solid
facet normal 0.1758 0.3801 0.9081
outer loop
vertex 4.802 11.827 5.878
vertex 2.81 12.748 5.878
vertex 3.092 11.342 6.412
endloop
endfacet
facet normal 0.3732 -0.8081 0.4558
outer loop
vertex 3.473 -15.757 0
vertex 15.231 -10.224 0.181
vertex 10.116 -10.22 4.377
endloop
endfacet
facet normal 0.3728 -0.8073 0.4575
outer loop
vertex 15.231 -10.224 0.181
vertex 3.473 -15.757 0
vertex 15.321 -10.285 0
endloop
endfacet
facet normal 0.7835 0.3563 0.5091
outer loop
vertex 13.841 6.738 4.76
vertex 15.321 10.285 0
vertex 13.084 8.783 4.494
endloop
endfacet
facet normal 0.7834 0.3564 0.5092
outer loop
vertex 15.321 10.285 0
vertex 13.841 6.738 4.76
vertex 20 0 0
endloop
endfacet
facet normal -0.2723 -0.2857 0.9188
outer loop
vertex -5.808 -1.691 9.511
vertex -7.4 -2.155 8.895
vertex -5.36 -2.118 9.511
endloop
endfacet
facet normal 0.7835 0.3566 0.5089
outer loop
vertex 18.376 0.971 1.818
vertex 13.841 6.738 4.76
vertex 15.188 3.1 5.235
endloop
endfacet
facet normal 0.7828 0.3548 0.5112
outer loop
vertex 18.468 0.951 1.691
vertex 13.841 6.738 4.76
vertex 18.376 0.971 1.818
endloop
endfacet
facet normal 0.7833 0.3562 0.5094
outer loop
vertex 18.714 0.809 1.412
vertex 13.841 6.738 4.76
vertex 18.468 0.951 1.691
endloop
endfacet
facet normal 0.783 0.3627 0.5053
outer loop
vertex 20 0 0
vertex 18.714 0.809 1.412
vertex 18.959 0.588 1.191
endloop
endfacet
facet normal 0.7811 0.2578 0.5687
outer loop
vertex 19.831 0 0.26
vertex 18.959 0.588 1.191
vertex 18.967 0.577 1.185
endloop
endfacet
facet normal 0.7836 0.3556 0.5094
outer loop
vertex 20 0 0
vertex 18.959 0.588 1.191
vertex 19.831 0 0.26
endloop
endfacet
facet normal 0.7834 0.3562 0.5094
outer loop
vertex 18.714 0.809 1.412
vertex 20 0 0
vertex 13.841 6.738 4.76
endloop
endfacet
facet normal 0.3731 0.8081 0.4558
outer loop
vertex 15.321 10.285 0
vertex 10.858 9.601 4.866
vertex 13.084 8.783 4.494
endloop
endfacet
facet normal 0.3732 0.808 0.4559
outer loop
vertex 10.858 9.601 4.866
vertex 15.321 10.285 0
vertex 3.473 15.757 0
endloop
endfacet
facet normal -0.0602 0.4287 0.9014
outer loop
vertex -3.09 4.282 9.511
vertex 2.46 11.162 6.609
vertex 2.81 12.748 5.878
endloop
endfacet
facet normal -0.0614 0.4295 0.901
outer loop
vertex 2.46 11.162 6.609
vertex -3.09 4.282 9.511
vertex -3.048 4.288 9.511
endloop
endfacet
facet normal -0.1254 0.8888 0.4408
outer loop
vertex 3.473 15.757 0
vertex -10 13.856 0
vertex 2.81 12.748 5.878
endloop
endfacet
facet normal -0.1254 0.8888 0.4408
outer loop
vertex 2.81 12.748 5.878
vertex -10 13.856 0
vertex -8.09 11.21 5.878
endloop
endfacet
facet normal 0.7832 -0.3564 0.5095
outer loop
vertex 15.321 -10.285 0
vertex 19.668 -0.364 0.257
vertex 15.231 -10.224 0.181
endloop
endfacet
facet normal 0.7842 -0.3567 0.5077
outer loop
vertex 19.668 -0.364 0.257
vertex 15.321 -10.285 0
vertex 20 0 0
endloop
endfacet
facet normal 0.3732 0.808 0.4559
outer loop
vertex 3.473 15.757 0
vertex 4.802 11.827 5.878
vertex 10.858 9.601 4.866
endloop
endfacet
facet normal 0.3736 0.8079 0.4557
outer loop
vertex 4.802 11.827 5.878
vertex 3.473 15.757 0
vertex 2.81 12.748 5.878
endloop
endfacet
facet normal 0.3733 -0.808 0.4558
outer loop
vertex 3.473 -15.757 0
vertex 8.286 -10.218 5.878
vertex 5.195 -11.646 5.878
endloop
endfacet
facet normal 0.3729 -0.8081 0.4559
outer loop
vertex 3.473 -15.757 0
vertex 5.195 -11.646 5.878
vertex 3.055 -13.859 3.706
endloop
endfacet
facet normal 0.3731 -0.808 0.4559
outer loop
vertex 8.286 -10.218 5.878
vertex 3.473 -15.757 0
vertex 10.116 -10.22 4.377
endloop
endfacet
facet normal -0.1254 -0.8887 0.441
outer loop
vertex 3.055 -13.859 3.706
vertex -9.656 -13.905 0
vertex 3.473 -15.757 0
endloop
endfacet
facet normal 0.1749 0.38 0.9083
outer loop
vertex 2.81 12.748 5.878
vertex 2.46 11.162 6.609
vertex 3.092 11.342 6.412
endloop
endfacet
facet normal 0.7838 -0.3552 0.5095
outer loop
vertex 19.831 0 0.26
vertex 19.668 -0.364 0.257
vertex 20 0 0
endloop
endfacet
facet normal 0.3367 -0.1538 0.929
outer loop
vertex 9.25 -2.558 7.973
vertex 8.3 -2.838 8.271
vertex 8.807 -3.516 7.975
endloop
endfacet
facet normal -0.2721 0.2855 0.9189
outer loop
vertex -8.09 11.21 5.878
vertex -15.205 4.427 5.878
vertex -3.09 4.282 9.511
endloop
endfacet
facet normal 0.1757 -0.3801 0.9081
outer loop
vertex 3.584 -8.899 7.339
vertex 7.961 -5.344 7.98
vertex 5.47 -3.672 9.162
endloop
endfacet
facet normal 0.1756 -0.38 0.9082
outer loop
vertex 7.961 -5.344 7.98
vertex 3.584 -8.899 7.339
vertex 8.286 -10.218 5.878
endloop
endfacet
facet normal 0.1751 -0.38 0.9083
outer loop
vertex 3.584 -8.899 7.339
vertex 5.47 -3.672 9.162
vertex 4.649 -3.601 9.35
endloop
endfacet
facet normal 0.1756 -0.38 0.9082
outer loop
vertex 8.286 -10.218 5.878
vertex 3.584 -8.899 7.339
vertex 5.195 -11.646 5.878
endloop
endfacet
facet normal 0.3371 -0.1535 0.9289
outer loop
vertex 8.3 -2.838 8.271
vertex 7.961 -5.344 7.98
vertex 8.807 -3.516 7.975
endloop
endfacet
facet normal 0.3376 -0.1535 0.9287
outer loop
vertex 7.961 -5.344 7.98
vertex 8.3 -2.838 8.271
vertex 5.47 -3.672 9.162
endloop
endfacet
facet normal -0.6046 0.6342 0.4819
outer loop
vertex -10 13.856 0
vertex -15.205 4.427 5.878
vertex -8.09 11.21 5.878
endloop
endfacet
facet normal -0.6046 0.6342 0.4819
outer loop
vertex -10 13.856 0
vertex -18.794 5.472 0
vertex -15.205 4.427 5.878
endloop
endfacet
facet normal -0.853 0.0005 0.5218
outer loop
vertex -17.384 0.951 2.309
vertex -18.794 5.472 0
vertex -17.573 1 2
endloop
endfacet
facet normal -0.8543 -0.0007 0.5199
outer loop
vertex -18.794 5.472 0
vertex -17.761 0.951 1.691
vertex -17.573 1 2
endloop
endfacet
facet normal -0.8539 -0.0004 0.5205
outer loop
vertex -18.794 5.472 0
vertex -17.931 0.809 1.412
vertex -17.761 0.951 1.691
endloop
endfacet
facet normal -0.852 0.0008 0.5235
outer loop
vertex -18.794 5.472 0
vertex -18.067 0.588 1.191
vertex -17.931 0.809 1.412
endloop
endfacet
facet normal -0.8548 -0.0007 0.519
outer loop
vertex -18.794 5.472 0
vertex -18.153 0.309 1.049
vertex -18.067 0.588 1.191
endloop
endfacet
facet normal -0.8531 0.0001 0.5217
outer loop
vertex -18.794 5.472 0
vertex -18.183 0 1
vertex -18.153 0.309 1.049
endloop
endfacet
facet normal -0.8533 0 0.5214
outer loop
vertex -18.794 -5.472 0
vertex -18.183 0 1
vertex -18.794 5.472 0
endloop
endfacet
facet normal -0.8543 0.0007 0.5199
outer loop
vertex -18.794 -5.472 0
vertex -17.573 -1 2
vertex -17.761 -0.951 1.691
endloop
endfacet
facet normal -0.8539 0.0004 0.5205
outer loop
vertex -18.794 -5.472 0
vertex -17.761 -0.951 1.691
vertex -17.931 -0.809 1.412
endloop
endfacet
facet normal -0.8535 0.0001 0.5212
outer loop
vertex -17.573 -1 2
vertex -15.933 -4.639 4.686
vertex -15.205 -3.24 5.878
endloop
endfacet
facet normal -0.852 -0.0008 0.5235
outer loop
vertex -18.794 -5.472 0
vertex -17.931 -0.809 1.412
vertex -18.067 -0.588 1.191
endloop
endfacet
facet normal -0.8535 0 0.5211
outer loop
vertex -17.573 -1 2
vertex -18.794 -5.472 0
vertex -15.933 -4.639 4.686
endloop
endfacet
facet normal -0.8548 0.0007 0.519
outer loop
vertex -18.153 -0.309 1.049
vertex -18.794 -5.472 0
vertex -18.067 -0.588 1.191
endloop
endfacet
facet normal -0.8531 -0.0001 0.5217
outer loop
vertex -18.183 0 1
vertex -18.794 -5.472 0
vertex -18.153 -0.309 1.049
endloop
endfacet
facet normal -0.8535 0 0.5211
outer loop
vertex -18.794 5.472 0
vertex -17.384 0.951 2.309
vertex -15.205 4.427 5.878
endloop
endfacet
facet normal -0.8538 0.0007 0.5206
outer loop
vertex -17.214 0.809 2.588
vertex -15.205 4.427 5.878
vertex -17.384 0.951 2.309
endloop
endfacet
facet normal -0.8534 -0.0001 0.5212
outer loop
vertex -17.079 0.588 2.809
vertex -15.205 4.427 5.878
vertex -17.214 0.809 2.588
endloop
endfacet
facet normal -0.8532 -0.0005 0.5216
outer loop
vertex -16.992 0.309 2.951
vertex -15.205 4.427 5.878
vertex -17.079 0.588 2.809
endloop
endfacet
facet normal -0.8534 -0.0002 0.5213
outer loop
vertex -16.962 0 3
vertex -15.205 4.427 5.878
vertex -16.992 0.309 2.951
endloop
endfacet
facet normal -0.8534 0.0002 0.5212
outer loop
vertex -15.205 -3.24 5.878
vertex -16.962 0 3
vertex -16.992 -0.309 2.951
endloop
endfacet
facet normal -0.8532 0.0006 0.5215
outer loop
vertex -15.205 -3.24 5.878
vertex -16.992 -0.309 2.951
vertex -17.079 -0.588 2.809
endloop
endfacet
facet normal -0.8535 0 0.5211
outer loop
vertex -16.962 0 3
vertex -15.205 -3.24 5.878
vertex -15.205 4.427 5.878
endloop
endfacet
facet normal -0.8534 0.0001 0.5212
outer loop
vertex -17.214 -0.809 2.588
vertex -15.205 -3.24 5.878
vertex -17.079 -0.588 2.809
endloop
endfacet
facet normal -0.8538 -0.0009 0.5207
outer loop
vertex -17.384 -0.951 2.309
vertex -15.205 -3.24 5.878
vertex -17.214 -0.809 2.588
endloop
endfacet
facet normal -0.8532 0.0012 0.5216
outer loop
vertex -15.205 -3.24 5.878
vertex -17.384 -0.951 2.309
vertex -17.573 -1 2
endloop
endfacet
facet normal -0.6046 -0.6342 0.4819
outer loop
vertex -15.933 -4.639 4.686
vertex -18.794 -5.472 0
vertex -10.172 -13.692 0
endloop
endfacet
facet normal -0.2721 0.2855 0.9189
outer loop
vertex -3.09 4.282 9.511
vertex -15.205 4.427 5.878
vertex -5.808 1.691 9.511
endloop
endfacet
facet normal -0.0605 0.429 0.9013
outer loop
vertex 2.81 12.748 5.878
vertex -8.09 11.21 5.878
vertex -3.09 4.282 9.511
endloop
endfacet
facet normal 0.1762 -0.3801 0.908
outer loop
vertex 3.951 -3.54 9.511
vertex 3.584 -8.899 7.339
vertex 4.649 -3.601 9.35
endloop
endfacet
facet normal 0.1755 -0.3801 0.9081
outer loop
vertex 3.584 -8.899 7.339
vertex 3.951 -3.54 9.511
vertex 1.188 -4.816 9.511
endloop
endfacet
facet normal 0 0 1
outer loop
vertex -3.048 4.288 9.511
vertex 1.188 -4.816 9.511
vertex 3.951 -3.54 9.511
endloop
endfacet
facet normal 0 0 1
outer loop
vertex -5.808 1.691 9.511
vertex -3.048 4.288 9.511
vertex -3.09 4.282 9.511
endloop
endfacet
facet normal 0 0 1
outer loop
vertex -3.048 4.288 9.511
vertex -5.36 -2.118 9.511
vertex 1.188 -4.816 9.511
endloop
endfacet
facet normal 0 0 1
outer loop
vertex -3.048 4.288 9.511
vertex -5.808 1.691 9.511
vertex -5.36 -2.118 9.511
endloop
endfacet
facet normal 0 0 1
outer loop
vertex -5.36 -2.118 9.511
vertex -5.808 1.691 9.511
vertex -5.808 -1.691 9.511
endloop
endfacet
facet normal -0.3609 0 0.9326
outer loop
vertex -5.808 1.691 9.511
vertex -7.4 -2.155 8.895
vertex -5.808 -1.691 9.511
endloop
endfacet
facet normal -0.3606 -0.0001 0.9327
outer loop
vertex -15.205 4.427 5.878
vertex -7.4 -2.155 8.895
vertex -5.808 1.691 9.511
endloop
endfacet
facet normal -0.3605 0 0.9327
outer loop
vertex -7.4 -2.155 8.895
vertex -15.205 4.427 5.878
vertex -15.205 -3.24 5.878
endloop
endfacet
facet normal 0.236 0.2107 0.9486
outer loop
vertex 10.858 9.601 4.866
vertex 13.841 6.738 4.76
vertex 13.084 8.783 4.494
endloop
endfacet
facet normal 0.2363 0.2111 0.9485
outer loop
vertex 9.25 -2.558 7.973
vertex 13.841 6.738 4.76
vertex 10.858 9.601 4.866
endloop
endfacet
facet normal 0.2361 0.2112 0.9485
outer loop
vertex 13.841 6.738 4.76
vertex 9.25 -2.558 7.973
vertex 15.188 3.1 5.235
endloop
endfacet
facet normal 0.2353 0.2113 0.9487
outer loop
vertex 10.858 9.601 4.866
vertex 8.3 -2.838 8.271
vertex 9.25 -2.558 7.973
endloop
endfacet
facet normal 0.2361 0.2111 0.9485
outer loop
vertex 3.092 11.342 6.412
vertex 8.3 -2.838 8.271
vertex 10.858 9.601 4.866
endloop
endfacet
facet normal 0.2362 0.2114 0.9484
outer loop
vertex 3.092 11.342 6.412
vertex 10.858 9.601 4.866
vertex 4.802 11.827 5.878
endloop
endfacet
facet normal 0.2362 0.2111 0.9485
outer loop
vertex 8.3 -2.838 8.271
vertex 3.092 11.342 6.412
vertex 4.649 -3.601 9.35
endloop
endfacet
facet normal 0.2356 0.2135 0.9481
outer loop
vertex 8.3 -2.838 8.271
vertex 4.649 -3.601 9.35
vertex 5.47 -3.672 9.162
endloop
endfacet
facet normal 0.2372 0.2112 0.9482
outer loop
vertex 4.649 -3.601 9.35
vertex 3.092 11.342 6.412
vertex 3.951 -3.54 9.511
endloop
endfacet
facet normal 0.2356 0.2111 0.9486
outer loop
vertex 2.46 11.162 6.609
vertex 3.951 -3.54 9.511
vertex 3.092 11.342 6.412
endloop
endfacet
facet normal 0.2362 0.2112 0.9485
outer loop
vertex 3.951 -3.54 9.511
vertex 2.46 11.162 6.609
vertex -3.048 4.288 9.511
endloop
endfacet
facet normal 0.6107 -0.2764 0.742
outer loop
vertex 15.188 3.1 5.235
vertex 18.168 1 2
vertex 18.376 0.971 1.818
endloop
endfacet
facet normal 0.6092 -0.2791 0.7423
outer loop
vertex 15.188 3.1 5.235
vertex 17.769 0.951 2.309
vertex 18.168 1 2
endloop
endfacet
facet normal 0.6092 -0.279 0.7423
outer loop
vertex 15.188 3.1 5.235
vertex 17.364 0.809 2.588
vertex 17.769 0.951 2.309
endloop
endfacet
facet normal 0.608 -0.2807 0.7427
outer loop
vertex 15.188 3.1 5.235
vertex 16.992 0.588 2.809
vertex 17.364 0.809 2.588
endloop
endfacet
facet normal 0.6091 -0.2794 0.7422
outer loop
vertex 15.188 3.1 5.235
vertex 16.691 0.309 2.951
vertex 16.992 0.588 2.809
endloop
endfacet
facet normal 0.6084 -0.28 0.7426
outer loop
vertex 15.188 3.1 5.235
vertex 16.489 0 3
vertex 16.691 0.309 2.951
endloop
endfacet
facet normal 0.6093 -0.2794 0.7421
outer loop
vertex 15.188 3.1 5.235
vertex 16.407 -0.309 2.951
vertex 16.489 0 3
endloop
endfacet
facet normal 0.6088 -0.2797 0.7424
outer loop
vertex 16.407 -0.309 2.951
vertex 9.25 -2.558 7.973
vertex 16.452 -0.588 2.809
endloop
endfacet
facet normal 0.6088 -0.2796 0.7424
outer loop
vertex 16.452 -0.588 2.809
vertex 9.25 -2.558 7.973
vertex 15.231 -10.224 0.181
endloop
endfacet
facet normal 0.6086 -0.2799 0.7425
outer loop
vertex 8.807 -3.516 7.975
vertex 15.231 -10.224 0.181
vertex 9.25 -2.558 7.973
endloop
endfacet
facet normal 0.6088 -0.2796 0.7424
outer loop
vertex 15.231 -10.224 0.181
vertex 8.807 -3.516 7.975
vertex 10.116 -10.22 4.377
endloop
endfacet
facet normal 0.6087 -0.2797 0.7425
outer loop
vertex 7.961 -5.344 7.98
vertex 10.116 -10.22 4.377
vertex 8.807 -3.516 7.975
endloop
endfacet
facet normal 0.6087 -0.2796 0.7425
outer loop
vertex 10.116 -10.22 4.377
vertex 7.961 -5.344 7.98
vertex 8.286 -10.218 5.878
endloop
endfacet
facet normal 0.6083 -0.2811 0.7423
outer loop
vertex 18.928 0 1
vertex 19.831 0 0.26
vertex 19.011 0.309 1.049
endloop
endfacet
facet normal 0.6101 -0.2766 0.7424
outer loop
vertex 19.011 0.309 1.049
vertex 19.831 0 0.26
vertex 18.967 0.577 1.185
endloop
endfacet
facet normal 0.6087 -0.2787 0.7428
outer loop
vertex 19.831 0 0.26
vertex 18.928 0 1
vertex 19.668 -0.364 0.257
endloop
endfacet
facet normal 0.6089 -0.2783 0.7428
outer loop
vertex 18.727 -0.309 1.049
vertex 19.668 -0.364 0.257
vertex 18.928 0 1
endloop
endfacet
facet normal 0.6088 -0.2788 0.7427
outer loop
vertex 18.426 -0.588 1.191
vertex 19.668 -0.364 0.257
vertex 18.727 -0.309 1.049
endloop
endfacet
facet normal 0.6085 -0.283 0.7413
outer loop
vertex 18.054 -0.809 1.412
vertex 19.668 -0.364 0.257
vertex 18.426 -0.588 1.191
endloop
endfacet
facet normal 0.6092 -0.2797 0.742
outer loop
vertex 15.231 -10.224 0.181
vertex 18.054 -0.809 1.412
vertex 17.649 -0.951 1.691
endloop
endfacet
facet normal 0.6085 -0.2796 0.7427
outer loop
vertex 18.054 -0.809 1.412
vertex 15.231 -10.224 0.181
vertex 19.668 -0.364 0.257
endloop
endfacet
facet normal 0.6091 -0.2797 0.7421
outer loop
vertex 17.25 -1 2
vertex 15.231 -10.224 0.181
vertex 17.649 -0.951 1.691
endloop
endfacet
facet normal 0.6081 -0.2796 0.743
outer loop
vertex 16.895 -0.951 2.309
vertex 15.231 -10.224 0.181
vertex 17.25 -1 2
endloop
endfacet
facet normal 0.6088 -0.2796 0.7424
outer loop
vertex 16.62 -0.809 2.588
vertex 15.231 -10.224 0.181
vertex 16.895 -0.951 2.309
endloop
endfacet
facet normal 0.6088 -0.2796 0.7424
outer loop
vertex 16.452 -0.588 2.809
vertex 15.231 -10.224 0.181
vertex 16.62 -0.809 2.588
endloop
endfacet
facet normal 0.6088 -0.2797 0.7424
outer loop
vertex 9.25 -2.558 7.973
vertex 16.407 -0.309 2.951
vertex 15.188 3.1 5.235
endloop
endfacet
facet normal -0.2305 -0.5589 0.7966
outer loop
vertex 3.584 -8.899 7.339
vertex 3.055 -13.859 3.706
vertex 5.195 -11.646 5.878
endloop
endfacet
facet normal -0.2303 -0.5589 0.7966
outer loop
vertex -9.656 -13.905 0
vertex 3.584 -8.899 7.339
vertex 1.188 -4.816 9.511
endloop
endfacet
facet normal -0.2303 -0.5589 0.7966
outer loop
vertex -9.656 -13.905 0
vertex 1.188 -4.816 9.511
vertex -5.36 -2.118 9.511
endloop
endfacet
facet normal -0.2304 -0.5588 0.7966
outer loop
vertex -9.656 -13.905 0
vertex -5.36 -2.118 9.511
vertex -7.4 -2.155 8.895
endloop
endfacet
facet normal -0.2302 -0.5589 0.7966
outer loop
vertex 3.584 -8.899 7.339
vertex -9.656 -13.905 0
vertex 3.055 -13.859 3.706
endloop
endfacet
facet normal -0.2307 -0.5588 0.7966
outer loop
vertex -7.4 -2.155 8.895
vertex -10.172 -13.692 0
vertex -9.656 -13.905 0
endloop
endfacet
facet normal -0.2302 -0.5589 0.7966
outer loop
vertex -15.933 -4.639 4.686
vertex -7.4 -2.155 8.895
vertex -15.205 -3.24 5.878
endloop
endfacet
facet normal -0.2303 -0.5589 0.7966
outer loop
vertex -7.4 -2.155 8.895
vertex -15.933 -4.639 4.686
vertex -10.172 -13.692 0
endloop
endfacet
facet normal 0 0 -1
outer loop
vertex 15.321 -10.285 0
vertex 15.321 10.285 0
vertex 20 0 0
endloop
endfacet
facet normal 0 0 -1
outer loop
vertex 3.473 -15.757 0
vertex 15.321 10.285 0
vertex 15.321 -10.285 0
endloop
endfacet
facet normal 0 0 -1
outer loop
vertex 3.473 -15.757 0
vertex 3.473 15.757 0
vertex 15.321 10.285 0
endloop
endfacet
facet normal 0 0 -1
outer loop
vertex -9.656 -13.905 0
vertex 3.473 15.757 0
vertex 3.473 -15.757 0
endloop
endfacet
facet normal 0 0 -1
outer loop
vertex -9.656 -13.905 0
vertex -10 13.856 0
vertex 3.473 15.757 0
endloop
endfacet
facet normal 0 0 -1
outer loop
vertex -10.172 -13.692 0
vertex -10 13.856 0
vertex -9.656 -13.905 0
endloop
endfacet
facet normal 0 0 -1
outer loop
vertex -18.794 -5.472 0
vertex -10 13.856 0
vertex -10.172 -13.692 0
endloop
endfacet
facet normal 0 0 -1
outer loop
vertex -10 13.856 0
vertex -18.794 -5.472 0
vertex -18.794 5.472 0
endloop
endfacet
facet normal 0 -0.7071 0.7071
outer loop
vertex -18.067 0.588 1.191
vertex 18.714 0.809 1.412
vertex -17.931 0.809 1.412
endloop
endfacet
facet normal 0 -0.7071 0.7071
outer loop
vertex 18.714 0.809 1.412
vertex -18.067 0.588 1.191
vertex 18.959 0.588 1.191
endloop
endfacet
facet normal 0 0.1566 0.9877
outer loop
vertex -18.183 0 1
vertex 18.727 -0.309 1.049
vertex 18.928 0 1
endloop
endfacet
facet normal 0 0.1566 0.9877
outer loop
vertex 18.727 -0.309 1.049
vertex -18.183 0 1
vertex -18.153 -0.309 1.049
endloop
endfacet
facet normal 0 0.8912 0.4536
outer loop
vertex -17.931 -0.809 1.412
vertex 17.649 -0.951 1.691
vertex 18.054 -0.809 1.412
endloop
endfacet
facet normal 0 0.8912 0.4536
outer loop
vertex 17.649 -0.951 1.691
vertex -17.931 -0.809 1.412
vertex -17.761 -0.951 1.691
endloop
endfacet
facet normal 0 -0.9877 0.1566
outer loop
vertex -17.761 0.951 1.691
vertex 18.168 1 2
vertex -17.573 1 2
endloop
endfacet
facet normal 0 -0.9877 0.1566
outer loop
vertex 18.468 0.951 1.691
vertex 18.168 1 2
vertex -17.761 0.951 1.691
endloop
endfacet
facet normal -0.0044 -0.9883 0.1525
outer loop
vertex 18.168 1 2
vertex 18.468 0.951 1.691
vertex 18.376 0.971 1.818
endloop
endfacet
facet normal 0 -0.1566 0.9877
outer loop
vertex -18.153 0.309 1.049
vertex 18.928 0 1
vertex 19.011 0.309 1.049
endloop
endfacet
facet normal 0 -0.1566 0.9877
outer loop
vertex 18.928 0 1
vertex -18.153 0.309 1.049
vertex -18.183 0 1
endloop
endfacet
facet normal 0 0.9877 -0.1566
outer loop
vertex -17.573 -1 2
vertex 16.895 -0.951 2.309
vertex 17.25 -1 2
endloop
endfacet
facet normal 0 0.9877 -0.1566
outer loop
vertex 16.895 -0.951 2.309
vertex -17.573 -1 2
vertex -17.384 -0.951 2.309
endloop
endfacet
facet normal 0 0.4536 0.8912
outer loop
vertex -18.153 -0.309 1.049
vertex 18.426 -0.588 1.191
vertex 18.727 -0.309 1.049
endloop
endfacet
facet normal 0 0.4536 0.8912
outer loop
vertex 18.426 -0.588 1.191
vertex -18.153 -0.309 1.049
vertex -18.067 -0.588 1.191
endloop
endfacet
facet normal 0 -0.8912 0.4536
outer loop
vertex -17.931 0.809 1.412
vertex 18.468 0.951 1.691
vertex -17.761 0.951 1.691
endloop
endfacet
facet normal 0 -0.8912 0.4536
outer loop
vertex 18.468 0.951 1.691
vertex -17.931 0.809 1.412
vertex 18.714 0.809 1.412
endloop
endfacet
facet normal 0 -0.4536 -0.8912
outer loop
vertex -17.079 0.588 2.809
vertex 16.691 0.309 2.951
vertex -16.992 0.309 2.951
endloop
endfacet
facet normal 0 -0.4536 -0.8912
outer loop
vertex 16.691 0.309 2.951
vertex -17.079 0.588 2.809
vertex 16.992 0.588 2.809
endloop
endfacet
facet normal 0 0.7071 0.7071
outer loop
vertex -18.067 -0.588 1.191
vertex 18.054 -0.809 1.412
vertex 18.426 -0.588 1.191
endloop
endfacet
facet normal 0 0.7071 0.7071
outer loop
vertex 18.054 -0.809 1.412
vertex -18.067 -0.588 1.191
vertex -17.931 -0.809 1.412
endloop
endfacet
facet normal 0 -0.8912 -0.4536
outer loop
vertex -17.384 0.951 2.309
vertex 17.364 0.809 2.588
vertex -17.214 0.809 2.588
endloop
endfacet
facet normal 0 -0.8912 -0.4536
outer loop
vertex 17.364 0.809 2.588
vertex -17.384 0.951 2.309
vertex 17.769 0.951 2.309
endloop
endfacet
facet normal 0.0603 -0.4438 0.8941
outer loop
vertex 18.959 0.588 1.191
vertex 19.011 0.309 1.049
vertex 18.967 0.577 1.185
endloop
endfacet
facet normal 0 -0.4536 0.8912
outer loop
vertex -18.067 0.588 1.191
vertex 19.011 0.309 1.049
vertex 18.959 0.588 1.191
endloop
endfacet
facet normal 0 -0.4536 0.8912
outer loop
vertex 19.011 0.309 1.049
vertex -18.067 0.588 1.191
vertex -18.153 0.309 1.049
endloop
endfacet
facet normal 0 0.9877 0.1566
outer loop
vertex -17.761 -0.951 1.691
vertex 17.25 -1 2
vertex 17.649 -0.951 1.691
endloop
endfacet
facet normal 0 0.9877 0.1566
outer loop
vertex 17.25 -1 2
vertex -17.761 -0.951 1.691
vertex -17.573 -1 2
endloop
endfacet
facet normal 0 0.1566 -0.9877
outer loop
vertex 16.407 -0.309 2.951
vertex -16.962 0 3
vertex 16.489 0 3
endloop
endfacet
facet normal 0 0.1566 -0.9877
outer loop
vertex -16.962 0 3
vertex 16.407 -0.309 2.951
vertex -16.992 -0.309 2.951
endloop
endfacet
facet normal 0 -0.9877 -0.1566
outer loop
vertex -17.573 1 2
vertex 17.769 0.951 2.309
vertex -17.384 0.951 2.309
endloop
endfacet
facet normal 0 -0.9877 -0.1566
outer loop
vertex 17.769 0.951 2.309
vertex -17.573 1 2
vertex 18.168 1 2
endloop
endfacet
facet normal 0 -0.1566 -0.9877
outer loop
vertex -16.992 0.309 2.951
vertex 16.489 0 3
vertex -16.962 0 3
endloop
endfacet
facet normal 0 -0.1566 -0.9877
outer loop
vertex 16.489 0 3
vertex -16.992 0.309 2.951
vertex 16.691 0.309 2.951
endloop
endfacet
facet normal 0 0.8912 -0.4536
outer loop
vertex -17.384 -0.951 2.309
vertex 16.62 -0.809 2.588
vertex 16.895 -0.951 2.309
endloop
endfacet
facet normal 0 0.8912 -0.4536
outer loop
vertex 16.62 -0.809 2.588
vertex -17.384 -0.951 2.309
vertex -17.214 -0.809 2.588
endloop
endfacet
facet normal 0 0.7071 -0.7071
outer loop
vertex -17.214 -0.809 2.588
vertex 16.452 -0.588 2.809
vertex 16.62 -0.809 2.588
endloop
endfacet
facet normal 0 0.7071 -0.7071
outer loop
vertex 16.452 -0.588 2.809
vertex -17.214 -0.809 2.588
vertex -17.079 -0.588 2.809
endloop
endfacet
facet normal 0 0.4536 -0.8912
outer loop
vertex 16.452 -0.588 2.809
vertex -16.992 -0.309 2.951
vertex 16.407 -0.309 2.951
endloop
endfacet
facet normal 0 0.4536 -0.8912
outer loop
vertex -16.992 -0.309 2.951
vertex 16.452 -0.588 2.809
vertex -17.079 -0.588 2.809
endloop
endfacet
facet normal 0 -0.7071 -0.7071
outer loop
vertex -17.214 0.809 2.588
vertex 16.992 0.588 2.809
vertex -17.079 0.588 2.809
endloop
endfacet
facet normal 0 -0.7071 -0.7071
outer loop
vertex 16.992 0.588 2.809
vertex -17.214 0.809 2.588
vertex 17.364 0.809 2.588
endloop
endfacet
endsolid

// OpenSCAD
  
module b() {
  rotate([90, 0, 0]) difference() {
    cylinder(h=2, r=12);
    cylinder(h=2, r=10);
  }
}

module c() {
  translate([0,0,2]) rotate([0, 90, 0]) cylinder(h=100, r=1, center=true, $fn=20);
}

module a() {
  scale([1, .8, .5]) difference() {
  sphere(20, $fn=9);

  translate([0,0,37])
    rotate([10, 30, 55]) 
    cube([100, 100, 30], center=true);
  translate([16,0,37])
    rotate([30, 55, 15]) 
    cube([100, 100, 30], center=true);
  translate([-16,0,40])
    rotate([-130, -15, -15]) 
    cube([100, 100, 30], center=true);
    
  translate([0,0,-15])
    cube([100, 100, 30], center=true);
  }
}

difference() {
  a();
  c();
}
